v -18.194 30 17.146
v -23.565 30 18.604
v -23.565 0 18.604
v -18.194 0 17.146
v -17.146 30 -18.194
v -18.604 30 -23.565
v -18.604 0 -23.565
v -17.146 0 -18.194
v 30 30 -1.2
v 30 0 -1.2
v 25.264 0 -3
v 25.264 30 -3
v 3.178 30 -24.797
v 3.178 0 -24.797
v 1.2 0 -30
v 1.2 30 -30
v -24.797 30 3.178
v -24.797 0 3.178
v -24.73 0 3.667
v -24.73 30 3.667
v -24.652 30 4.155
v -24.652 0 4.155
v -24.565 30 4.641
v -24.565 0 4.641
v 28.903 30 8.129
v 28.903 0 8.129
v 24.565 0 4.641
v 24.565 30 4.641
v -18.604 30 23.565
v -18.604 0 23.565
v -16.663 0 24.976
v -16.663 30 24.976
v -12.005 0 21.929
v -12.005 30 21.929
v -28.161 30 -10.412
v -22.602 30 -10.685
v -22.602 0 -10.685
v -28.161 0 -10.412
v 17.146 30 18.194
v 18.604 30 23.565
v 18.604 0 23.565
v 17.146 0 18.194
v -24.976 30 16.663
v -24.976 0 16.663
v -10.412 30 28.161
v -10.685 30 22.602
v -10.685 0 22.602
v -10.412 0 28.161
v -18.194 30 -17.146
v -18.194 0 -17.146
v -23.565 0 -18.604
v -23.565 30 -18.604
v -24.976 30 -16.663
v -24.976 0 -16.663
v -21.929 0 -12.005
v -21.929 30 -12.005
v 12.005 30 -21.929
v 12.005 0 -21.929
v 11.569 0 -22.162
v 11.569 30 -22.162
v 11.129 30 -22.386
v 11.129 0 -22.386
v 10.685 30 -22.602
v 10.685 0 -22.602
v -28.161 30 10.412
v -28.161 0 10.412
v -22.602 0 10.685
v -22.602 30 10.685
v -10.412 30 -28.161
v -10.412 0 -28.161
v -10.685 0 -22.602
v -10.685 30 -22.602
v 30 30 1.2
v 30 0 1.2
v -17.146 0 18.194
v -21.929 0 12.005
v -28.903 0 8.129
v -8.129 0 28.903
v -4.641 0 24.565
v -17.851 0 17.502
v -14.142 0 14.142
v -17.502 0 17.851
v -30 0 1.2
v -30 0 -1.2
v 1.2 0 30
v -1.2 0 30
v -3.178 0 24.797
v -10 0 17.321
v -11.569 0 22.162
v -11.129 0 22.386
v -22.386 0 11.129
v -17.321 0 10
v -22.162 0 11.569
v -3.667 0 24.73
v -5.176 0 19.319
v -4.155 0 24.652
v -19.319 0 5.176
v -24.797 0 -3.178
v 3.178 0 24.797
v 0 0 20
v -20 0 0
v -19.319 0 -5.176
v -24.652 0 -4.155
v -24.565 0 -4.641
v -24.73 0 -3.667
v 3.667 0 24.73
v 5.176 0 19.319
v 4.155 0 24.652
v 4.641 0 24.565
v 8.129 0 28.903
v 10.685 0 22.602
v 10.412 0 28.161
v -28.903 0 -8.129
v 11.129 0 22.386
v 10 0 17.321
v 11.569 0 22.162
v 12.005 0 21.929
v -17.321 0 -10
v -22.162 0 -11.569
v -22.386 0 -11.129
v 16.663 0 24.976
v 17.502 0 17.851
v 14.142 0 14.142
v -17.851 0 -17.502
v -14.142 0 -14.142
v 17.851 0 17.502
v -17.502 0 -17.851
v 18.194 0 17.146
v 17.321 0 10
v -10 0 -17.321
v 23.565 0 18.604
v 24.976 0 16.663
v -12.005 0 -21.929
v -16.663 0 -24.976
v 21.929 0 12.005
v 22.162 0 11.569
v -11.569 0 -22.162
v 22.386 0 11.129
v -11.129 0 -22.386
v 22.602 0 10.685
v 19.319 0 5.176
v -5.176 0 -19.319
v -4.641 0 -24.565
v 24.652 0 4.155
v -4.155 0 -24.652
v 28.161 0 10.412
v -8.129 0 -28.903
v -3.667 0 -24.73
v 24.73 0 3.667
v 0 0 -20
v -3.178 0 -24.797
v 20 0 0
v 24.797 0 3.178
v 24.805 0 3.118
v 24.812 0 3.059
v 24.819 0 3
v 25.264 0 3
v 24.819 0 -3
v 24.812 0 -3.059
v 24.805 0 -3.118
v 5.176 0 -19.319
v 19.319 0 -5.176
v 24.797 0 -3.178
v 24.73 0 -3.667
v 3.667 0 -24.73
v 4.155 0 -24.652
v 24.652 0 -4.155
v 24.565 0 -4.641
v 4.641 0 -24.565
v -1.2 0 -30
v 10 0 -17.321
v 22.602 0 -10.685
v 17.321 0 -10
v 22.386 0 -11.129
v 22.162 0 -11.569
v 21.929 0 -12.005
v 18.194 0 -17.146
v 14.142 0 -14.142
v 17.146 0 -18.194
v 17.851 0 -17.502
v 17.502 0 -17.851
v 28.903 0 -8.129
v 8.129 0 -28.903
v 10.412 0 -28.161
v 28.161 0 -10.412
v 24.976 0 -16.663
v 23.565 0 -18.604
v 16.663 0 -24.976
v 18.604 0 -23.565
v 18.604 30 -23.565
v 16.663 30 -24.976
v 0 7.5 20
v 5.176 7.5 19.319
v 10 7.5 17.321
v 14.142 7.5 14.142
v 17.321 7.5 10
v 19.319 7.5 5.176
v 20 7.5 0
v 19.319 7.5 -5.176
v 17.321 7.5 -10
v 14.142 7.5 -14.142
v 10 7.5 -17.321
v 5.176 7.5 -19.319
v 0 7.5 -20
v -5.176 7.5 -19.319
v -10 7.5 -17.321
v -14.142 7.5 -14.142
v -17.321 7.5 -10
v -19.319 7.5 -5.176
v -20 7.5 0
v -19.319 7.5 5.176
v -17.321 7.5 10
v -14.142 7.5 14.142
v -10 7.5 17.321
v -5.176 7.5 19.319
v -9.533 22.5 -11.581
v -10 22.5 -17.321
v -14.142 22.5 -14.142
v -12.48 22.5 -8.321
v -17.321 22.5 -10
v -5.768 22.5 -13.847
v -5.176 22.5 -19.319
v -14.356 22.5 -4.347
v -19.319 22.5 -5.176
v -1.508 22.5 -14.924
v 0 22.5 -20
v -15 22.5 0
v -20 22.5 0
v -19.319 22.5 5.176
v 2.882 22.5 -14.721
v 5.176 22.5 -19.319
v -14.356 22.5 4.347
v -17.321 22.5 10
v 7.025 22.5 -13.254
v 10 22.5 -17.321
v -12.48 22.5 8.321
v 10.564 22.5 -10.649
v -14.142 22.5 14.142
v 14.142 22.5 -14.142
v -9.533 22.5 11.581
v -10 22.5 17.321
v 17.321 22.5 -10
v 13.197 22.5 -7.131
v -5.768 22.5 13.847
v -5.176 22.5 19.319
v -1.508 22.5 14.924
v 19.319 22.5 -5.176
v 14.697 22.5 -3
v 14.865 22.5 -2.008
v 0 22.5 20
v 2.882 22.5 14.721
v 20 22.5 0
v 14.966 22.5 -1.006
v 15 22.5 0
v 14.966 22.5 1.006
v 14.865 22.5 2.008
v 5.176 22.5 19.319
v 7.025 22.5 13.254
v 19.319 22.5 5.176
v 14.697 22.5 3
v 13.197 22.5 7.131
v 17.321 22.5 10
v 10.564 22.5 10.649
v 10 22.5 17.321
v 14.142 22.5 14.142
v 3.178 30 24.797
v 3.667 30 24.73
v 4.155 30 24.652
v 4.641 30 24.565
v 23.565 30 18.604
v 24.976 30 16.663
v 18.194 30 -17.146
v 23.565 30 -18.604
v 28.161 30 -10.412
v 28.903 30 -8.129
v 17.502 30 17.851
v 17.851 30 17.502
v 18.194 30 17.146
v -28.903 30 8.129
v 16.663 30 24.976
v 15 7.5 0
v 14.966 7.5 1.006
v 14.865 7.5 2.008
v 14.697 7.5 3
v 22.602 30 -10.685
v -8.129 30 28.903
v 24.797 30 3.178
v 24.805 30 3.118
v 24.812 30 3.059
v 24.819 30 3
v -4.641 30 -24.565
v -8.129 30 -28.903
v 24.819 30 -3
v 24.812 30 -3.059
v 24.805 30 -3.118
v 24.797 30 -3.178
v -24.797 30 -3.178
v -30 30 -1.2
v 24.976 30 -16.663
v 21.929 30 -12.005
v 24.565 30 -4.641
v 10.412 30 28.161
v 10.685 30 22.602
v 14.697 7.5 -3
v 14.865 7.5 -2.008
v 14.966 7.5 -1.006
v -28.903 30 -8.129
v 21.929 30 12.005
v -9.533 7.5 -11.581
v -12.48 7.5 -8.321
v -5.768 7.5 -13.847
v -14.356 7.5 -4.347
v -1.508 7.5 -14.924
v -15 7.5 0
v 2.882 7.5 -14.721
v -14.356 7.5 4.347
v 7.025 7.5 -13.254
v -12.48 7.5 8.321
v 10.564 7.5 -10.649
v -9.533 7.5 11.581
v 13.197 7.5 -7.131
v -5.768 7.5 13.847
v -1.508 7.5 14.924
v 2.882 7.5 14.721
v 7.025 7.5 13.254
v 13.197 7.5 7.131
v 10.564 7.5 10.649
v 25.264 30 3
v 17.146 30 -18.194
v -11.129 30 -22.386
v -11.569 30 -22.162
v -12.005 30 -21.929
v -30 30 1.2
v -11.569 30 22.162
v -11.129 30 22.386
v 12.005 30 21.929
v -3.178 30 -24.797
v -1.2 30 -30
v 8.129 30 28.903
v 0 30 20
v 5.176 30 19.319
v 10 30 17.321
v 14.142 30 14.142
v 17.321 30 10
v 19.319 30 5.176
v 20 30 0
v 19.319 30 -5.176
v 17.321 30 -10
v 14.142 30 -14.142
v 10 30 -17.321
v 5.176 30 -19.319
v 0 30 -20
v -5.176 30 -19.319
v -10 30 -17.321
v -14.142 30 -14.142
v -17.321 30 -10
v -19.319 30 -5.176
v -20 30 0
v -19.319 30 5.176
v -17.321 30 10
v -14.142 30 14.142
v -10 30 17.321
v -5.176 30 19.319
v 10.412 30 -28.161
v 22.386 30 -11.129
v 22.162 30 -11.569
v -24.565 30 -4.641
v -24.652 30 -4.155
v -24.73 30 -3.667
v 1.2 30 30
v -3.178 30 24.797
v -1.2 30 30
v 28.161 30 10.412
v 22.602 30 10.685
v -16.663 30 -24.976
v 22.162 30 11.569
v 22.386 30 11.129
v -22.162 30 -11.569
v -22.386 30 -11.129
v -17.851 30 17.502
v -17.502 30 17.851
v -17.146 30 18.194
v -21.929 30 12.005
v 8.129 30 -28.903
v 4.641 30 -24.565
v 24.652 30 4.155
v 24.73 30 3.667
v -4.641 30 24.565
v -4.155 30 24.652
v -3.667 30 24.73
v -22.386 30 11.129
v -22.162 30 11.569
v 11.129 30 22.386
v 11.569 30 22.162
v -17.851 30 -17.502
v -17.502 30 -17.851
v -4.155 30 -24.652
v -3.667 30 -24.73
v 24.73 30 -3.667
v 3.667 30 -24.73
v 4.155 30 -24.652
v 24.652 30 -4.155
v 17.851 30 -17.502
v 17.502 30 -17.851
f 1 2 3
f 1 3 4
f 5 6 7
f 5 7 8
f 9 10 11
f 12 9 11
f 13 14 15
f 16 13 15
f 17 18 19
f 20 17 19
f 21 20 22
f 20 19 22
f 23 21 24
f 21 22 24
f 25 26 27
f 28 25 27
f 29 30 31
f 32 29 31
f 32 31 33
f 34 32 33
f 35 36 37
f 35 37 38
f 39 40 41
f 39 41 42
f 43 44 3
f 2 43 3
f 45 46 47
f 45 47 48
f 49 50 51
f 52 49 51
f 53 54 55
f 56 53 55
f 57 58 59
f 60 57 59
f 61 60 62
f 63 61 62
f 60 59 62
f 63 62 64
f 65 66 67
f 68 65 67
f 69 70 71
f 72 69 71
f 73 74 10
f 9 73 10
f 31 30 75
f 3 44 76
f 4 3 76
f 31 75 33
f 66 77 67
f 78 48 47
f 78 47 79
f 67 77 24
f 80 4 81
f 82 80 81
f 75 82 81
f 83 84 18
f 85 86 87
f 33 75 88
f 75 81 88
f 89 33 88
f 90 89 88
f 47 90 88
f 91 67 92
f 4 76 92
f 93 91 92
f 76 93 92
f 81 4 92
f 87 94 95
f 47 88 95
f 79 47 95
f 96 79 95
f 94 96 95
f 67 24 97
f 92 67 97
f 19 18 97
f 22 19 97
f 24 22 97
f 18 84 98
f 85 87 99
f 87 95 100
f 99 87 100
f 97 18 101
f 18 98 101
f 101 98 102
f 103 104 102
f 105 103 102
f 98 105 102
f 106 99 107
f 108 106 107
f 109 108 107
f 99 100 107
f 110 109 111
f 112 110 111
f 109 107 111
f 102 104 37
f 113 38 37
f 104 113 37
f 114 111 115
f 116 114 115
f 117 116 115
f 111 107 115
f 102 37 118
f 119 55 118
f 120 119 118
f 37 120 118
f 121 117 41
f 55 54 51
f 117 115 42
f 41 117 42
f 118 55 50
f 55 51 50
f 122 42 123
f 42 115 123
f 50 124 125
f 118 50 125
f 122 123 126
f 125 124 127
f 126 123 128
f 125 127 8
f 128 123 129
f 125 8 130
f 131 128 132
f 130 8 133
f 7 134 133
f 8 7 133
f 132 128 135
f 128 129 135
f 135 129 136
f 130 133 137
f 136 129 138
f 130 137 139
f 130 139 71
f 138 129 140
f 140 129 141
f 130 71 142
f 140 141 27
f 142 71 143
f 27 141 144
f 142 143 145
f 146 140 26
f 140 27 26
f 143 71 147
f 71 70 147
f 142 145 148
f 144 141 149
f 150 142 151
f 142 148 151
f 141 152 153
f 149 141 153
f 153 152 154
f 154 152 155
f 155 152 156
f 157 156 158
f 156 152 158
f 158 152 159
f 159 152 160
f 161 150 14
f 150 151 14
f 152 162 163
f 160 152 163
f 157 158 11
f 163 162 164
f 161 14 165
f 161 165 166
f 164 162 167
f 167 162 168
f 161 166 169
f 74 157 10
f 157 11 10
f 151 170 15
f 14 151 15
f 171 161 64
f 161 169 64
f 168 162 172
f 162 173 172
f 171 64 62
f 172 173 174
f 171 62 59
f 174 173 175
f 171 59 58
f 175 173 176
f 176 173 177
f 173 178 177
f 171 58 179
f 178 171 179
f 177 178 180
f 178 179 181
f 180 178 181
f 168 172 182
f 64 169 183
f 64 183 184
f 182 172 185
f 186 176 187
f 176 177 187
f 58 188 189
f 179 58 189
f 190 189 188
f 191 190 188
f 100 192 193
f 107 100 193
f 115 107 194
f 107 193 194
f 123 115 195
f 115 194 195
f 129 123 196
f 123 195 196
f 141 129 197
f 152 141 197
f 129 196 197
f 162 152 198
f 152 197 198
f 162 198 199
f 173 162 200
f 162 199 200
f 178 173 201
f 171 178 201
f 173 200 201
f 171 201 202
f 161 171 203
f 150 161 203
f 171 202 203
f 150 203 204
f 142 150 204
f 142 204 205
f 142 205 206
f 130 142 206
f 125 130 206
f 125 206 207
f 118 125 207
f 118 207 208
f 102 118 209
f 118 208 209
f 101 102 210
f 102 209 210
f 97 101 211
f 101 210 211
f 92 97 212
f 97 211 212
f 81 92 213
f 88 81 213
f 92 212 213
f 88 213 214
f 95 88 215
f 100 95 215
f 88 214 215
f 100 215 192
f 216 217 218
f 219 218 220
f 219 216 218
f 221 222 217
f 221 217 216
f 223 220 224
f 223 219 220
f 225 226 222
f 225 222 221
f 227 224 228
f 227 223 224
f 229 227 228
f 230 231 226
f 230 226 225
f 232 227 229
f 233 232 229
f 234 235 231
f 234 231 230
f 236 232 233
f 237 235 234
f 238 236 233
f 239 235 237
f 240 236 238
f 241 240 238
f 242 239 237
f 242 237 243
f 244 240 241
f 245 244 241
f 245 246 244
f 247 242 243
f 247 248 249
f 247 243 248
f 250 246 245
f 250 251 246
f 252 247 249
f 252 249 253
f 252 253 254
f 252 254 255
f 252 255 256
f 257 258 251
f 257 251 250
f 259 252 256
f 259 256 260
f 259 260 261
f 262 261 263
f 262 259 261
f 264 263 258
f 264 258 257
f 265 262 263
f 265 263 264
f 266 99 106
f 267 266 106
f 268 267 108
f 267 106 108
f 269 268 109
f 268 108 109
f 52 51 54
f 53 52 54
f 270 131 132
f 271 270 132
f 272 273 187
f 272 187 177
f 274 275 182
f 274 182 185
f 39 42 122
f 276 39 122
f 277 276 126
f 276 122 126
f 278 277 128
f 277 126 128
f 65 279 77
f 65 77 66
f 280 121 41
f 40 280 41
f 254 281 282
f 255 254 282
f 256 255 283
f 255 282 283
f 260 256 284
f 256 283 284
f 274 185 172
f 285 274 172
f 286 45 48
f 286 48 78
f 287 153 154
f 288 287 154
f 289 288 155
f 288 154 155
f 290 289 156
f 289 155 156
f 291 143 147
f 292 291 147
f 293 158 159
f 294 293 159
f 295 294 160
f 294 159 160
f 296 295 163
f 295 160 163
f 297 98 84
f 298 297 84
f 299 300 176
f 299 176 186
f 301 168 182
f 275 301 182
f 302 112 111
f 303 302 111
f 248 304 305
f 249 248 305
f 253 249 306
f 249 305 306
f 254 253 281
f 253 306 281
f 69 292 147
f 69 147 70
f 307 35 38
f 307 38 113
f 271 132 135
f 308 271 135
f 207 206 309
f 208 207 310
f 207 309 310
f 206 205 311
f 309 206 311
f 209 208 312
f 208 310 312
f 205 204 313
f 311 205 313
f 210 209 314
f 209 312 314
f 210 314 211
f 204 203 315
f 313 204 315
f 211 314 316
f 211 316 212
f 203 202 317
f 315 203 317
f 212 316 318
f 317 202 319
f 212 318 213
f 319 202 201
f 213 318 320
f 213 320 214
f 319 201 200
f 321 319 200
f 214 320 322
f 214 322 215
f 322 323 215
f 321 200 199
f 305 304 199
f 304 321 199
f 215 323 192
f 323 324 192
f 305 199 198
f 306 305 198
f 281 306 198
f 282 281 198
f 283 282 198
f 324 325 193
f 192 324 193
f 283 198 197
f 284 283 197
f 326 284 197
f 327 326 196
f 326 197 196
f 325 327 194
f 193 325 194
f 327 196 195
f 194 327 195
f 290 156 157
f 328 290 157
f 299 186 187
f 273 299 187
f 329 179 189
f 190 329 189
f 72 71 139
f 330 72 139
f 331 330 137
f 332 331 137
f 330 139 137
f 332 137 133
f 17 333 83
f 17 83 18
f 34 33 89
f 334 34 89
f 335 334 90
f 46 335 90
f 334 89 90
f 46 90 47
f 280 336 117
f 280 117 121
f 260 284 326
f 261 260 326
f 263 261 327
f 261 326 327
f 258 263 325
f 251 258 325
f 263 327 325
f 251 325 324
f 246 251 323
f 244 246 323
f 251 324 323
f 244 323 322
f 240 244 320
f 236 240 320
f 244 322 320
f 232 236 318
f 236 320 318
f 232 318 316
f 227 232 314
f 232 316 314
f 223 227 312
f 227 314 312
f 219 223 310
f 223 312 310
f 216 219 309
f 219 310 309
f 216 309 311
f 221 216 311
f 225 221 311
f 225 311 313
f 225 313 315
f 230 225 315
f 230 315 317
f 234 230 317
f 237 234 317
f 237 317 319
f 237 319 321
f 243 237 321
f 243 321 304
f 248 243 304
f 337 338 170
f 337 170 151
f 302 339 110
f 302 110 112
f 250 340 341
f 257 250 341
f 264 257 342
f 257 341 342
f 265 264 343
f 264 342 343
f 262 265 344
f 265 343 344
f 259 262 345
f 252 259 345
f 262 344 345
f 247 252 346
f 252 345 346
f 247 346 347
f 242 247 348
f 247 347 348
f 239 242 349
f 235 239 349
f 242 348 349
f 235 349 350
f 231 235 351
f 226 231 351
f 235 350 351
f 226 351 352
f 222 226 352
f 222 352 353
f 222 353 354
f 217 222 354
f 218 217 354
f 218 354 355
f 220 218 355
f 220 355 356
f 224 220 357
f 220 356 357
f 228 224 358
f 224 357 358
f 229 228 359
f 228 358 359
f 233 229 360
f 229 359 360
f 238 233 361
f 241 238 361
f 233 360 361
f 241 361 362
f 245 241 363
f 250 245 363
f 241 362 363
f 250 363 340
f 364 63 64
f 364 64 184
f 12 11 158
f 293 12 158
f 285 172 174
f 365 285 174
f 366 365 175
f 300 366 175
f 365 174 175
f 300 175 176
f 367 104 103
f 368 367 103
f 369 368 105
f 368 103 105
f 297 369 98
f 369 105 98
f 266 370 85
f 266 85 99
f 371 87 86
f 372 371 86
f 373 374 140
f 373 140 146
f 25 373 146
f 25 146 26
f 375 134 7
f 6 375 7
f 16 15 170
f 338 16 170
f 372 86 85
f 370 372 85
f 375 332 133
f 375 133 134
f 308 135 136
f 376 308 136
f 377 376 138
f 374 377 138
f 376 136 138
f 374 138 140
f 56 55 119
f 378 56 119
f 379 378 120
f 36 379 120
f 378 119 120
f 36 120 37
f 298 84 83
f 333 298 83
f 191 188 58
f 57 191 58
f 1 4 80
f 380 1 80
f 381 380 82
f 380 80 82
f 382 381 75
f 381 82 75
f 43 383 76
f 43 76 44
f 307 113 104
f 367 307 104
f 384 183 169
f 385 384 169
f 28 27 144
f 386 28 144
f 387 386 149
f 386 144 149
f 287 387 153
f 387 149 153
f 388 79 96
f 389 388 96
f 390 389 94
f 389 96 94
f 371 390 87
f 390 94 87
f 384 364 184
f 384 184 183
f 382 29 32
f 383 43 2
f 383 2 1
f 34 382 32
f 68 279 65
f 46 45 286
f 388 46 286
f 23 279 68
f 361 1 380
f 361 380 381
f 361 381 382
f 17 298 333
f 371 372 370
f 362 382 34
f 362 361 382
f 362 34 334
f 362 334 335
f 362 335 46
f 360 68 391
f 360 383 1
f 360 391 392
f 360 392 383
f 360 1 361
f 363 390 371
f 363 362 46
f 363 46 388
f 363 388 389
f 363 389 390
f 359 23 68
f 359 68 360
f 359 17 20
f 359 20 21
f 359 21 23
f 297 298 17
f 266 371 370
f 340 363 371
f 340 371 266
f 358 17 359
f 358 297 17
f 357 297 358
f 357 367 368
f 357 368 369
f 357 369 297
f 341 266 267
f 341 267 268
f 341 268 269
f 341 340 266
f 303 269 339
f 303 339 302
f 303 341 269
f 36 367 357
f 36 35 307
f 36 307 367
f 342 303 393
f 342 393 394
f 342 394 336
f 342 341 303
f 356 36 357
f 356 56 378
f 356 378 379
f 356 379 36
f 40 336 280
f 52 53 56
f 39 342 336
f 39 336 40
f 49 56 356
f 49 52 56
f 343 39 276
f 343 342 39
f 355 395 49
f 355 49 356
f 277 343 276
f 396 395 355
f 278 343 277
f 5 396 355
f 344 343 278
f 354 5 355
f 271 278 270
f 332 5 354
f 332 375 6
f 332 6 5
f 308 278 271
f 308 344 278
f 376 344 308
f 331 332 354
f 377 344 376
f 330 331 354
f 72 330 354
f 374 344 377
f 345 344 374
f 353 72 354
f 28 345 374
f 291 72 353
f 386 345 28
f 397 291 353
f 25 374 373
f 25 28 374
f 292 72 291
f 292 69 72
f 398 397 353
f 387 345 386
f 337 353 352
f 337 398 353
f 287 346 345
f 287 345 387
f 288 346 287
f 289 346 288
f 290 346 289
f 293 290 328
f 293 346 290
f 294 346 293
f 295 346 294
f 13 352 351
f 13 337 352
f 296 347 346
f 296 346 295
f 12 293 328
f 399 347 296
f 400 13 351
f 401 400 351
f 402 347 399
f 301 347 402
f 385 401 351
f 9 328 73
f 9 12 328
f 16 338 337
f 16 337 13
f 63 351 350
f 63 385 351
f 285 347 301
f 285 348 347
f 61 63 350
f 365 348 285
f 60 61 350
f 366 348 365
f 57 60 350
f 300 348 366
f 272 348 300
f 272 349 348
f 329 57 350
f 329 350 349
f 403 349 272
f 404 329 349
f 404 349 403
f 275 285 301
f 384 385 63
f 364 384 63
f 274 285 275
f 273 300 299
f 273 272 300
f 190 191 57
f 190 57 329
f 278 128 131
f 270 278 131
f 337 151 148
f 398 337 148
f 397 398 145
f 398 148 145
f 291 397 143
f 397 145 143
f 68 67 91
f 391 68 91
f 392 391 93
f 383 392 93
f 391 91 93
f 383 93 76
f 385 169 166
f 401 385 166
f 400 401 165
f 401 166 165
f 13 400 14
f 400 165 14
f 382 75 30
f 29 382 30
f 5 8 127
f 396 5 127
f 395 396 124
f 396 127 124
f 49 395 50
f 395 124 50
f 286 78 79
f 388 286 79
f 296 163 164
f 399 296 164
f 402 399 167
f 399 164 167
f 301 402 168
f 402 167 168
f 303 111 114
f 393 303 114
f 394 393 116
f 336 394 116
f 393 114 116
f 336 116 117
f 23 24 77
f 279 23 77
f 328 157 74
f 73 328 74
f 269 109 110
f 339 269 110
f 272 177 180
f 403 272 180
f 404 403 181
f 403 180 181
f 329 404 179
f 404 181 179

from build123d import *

# Parameters (mm, degrees)
SKETCH2_R           = 15
BOSS_EXTRUDE1_DEPTH = 30
SKETCH6_R           = 20
CUT_EXTRUDE2_DEPTH  = 7.5
CUT_EXTRUDE3_START  = -22.5
SKETCH6_2_R         = 20
CUT_EXTRUDE3_DEPTH  = 7.5


with BuildPart() as part:
    # Sketch2 → Boss-Extrude1 (new body)
    with BuildSketch(Plane(origin=(0, 0, 0), x_dir=(1, 0, 0), z_dir=(0, 1, 0))):
        with BuildLine():
            ThreePointArc((24.819347292, 3), (24.706042922, 3.822491744), (24.565489544, 4.640767551))
            Line((24.565489544, 4.640767551), (28.902515882, 8.129242012))
            Line((28.902515882, 8.129242012), (28.160875096, 10.411777651))
            Line((28.160875096, 10.411777651), (22.601673242, 10.684772654))
            ThreePointArc((22.601673242, 10.684772654), (22.275163105, 11.349762493), (21.929092867, 12.004785964))
            Line((21.929092867, 12.004785964), (24.975852134, 16.662737176))
            Line((24.975852134, 16.662737176), (23.565167528, 18.604377962))
            Line((23.565167528, 18.604377962), (18.193692285, 17.146123791))
            ThreePointArc((18.193692285, 17.146123791), (17.67766953, 17.67766953), (17.146123791, 18.193692285))
            Line((17.146123791, 18.193692285), (18.604377962, 23.565167528))
            Line((18.604377962, 23.565167528), (16.662737176, 24.975852134))
            Line((16.662737176, 24.975852134), (12.004785964, 21.929092867))
            ThreePointArc((12.004785964, 21.929092867), (11.349762493, 22.275163105), (10.684772654, 22.601673242))
            Line((10.684772654, 22.601673242), (10.411777651, 28.160875096))
            Line((10.411777651, 28.160875096), (8.129242012, 28.902515882))
            Line((8.129242012, 28.902515882), (4.640767551, 24.565489544))
            ThreePointArc((4.640767551, 24.565489544), (3.910861626, 24.692208515), (3.177521525, 24.797244947))
            Line((3.177521525, 24.797244947), (1.2, 30))
            Line((1.2, 30), (-1.2, 30))
            Line((-1.2, 30), (-3.177521525, 24.797244947))
            ThreePointArc((-3.177521525, 24.797244947), (-3.910861626, 24.692208515), (-4.640767551, 24.565489544))
            Line((-4.640767551, 24.565489544), (-8.129242012, 28.902515882))
            Line((-8.129242012, 28.902515882), (-10.411777651, 28.160875096))
            Line((-10.411777651, 28.160875096), (-10.684772654, 22.601673242))
            ThreePointArc((-10.684772654, 22.601673242), (-11.349762493, 22.275163105), (-12.004785964, 21.929092867))
            Line((-12.004785964, 21.929092867), (-16.662737176, 24.975852134))
            Line((-16.662737176, 24.975852134), (-18.604377962, 23.565167528))
            Line((-18.604377962, 23.565167528), (-17.146123791, 18.193692285))
            ThreePointArc((-17.146123791, 18.193692285), (-17.67766953, 17.67766953), (-18.193692285, 17.146123791))
            Line((-18.193692285, 17.146123791), (-23.565167528, 18.604377962))
            Line((-23.565167528, 18.604377962), (-24.975852134, 16.662737176))
            Line((-24.975852134, 16.662737176), (-21.929092867, 12.004785964))
            ThreePointArc((-21.929092867, 12.004785964), (-22.275163105, 11.349762493), (-22.601673242, 10.684772654))
            Line((-22.601673242, 10.684772654), (-28.160875096, 10.411777651))
            Line((-28.160875096, 10.411777651), (-28.902515882, 8.129242012))
            Line((-28.902515882, 8.129242012), (-24.565489544, 4.640767551))
            ThreePointArc((-24.565489544, 4.640767551), (-24.692208515, 3.910861626), (-24.797244947, 3.177521525))
            Line((-24.797244947, 3.177521525), (-30, 1.2))
            Line((-30, 1.2), (-30, -1.2))
            Line((-30, -1.2), (-24.797244947, -3.177521525))
            ThreePointArc((-24.797244947, -3.177521525), (-24.692208515, -3.910861626), (-24.565489544, -4.640767551))
            Line((-24.565489544, -4.640767551), (-28.902515882, -8.129242012))
            Line((-28.902515882, -8.129242012), (-28.160875096, -10.411777651))
            Line((-28.160875096, -10.411777651), (-22.601673242, -10.684772654))
            ThreePointArc((-22.601673242, -10.684772654), (-22.275163105, -11.349762493), (-21.929092867, -12.004785964))
            Line((-21.929092867, -12.004785964), (-24.975852134, -16.662737176))
            Line((-24.975852134, -16.662737176), (-23.565167528, -18.604377962))
            Line((-23.565167528, -18.604377962), (-18.193692285, -17.146123791))
            ThreePointArc((-18.193692285, -17.146123791), (-17.67766953, -17.67766953), (-17.146123791, -18.193692285))
            Line((-17.146123791, -18.193692285), (-18.604377962, -23.565167529))
            Line((-18.604377962, -23.565167529), (-16.662737176, -24.975852134))
            Line((-16.662737176, -24.975852134), (-12.004785964, -21.929092867))
            ThreePointArc((-12.004785964, -21.929092867), (-11.349762493, -22.275163105), (-10.684772654, -22.601673242))
            Line((-10.684772654, -22.601673242), (-10.411777651, -28.160875096))
            Line((-10.411777651, -28.160875096), (-8.129242012, -28.902515882))
            Line((-8.129242012, -28.902515882), (-4.640767551, -24.565489544))
            ThreePointArc((-4.640767551, -24.565489544), (-3.910861626, -24.692208515), (-3.177521525, -24.797244947))
            Line((-3.177521525, -24.797244947), (-1.2, -30))
            Line((-1.2, -30), (1.2, -30))
            Line((1.2, -30), (3.177521525, -24.797244947))
            ThreePointArc((3.177521525, -24.797244947), (3.910861626, -24.692208515), (4.640767551, -24.565489544))
            Line((4.640767551, -24.565489544), (8.129242012, -28.902515882))
            Line((8.129242012, -28.902515882), (10.411777651, -28.160875096))
            Line((10.411777651, -28.160875096), (10.684772654, -22.601673242))
            ThreePointArc((10.684772654, -22.601673242), (11.349762493, -22.275163105), (12.004785964, -21.929092867))
            Line((12.004785964, -21.929092867), (16.662737176, -24.975852134))
            Line((16.662737176, -24.975852134), (18.604377962, -23.565167528))
            Line((18.604377962, -23.565167528), (17.146123791, -18.193692285))
            ThreePointArc((17.146123791, -18.193692285), (17.67766953, -17.67766953), (18.193692285, -17.146123791))
            Line((18.193692285, -17.146123791), (23.565167529, -18.604377962))
            Line((23.565167529, -18.604377962), (24.975852134, -16.662737176))
            Line((24.975852134, -16.662737176), (21.929092867, -12.004785964))
            ThreePointArc((21.929092867, -12.004785964), (22.275163105, -11.349762493), (22.601673242, -10.684772654))
            Line((22.601673242, -10.684772654), (28.160875096, -10.411777651))
            Line((28.160875096, -10.411777651), (28.902515882, -8.129242012))
            Line((28.902515882, -8.129242012), (24.565489544, -4.640767551))
            ThreePointArc((24.565489544, -4.640767551), (24.706042922, -3.822491744), (24.819347292, -3))
            Line((24.819347292, -3), (25.264294735, -3))
            Line((25.264294735, -3), (30, -1.2))
            Line((30, -1.2), (30, 1.2))
            Line((30, 1.2), (25.264294735, 3))
            Line((25.264294735, 3), (24.819347292, 3))
        make_face()
        Circle(SKETCH2_R, mode=Mode.SUBTRACT)
    extrude(amount=BOSS_EXTRUDE1_DEPTH)

    # Sketch6 → Cut-Extrude2 (cut)
    with BuildSketch(Plane(origin=(0, 30, 0), x_dir=(1, 0, 0), z_dir=(0, 1, 0))):
        Circle(SKETCH6_R)
    extrude(amount=-CUT_EXTRUDE2_DEPTH, mode=Mode.SUBTRACT)

    # Sketch6<2> → Cut-Extrude3 (cut)
    with BuildSketch(Plane(origin=(0, 30, 0), x_dir=(1, 0, 0), z_dir=(0, 1, 0)).offset(CUT_EXTRUDE3_START)):
        Circle(SKETCH6_2_R)
    extrude(amount=-CUT_EXTRUDE3_DEPTH, mode=Mode.SUBTRACT)


solid = part.part
